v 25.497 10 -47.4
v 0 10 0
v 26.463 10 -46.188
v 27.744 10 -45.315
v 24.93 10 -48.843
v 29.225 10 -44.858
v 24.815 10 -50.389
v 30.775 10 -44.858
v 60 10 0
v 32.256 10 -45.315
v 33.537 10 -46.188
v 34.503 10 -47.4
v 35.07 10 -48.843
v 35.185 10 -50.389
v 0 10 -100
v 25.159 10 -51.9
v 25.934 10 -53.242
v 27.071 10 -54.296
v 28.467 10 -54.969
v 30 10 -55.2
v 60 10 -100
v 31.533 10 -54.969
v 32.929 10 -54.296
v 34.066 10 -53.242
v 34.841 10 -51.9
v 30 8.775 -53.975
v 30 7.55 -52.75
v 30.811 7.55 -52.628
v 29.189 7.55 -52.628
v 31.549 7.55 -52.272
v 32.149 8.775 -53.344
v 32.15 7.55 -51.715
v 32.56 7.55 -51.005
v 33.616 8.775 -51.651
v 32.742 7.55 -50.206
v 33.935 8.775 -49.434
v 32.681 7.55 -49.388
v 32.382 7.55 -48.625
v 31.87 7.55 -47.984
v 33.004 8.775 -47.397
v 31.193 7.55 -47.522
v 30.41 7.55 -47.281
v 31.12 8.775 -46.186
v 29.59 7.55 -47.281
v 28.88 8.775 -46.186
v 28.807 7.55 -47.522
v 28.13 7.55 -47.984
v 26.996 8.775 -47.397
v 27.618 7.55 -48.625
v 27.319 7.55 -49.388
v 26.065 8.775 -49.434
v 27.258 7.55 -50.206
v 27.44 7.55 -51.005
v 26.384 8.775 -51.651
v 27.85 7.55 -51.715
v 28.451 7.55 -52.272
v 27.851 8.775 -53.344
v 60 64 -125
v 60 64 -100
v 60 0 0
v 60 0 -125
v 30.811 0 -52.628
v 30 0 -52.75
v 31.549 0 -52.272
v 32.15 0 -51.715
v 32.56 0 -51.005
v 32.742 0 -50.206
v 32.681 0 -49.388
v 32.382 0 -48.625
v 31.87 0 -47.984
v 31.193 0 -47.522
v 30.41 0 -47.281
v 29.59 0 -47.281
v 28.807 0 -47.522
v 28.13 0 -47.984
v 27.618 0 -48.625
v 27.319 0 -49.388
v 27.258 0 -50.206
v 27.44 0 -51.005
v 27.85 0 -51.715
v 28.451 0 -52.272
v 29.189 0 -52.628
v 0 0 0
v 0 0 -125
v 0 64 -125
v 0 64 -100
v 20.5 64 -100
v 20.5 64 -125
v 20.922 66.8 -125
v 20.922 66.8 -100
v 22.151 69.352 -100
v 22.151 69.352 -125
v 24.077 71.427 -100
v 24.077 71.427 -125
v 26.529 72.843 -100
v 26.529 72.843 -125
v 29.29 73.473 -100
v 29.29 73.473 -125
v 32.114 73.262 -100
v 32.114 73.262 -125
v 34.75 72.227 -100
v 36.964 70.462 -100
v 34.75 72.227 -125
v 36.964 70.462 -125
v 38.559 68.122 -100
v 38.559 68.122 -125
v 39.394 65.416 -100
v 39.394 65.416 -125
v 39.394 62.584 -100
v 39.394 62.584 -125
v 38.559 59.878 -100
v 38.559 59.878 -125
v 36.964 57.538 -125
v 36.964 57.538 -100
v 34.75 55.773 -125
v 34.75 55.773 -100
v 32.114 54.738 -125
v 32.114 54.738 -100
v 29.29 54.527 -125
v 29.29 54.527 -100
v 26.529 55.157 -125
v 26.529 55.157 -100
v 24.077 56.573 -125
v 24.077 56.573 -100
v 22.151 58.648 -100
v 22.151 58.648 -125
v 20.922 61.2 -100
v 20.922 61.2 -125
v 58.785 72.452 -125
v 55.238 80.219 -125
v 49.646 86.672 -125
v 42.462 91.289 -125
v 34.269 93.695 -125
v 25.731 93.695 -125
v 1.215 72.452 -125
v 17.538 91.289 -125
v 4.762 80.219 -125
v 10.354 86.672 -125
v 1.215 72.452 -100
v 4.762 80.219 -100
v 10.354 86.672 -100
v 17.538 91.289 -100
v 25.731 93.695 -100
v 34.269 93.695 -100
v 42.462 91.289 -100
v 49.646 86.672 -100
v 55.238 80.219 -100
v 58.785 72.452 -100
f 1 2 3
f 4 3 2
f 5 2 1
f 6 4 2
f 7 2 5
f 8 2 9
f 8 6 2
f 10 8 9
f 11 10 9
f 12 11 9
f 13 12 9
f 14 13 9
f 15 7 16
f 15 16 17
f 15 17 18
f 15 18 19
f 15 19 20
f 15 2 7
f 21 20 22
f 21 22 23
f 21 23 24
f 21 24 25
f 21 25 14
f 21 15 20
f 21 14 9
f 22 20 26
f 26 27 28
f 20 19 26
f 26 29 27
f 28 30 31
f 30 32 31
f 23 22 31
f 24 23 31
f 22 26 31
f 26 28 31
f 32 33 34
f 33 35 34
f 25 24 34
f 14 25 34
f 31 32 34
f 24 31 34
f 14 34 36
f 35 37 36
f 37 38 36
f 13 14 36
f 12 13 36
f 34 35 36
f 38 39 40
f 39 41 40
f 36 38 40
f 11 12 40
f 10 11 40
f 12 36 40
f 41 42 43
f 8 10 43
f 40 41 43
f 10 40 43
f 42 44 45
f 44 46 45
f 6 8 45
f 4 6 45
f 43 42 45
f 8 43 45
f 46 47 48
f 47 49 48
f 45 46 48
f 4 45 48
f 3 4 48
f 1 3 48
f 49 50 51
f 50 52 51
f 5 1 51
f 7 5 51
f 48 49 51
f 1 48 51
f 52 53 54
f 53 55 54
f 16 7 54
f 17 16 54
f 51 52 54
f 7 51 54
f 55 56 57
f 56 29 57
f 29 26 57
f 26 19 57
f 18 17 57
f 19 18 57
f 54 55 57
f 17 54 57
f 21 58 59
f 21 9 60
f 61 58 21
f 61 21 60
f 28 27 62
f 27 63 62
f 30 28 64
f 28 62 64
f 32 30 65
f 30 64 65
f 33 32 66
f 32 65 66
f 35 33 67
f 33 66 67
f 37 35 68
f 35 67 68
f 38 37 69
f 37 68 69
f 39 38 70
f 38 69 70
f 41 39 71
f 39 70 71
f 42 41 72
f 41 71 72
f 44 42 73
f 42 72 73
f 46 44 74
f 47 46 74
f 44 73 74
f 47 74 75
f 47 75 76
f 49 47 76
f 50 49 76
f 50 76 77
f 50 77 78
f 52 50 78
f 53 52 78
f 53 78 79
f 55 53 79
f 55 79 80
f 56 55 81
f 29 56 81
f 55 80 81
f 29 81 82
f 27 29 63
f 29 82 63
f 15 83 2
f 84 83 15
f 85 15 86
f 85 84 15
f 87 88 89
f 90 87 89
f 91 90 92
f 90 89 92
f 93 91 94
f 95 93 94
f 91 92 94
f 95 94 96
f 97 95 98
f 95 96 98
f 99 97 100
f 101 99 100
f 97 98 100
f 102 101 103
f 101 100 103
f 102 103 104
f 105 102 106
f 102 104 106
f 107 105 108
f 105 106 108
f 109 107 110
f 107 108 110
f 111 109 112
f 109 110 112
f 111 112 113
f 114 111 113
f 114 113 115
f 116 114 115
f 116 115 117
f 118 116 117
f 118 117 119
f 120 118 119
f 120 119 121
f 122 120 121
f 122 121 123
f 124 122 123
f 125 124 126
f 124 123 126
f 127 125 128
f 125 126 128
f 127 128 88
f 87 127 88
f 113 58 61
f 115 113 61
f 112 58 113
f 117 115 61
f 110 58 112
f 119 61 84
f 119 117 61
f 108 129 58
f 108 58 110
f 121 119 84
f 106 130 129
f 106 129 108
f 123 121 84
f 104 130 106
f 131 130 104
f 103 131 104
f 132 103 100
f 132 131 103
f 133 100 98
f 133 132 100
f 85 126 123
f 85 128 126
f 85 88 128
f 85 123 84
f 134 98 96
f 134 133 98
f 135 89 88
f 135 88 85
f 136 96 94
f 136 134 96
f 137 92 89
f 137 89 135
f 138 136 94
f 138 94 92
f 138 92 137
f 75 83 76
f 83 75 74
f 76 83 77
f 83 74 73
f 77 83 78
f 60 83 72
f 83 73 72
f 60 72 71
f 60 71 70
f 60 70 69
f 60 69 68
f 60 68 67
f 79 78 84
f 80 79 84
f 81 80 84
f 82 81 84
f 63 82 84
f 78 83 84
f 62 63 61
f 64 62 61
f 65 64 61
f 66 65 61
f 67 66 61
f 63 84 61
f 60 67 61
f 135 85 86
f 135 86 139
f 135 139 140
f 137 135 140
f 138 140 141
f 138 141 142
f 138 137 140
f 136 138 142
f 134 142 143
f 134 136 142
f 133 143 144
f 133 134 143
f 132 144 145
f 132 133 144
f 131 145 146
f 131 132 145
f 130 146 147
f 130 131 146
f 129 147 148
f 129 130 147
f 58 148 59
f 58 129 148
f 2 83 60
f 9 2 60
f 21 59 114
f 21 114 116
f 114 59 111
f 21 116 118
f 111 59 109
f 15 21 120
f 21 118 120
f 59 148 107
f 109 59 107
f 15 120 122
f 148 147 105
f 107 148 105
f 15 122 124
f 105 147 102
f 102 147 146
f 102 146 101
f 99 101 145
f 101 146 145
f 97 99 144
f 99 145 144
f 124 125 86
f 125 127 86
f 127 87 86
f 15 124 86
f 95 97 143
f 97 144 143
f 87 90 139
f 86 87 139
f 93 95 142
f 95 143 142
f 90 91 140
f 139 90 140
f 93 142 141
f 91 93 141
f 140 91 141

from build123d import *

# Parameters (mm, degrees)
SKETCH1_W                                            = 60
SKETCH1_H                                            = 125
BOSS_EXTRUDE1_DEPTH                                  = 10
SKETCH2_R                                            = 9.5
BOSS_EXTRUDE2_DEPTH                                  = 25
CSK_FOR_M5_COUNTERSUNK_RAISED_HEAD_SCREW_D           = 5.5
CSK_FOR_M5_COUNTERSUNK_RAISED_HEAD_SCREW_CSINK_D     = 10.4
CSK_FOR_M5_COUNTERSUNK_RAISED_HEAD_SCREW_CSINK_ANGLE = 90


with BuildPart() as part:
    # Sketch1 → Boss-Extrude1 (new body)
    with BuildSketch(Plane(origin=(0, 0, 0), x_dir=(1, 0, 0), z_dir=(0, 1, 0))):
        with Locations((30, 62.5)):
            Rectangle(SKETCH1_W, SKETCH1_H)
    extrude(amount=BOSS_EXTRUDE1_DEPTH)

    # Sketch2 → Boss-Extrude2 (add)
    with BuildSketch(Plane(origin=(0, 0, -125), x_dir=(-1, 0, 0), z_dir=(0, 0, -1))):
        with BuildLine():
            Line((-60, 10), (0, 10))
            Line((0, 10), (0, 64))
            ThreePointArc((0, 64), (-30, 94), (-60, 64))
            Line((-60, 64), (-60, 10))
        make_face()
        with Locations((-30, 64)):
            Circle(SKETCH2_R, mode=Mode.SUBTRACT)
    extrude(amount=-BOSS_EXTRUDE2_DEPTH)

    # CSK for M5 Countersunk Raised Head Screw1 (through all)
    with Locations(Plane(origin=(30, 10, -50), x_dir=(0, 0, 1), z_dir=(0, 1, 0))):
        with Locations((0, 0)):
            CounterSinkHole(CSK_FOR_M5_COUNTERSUNK_RAISED_HEAD_SCREW_D / 2, CSK_FOR_M5_COUNTERSUNK_RAISED_HEAD_SCREW_CSINK_D / 2, counter_sink_angle=CSK_FOR_M5_COUNTERSUNK_RAISED_HEAD_SCREW_CSINK_ANGLE)


solid = part.part
